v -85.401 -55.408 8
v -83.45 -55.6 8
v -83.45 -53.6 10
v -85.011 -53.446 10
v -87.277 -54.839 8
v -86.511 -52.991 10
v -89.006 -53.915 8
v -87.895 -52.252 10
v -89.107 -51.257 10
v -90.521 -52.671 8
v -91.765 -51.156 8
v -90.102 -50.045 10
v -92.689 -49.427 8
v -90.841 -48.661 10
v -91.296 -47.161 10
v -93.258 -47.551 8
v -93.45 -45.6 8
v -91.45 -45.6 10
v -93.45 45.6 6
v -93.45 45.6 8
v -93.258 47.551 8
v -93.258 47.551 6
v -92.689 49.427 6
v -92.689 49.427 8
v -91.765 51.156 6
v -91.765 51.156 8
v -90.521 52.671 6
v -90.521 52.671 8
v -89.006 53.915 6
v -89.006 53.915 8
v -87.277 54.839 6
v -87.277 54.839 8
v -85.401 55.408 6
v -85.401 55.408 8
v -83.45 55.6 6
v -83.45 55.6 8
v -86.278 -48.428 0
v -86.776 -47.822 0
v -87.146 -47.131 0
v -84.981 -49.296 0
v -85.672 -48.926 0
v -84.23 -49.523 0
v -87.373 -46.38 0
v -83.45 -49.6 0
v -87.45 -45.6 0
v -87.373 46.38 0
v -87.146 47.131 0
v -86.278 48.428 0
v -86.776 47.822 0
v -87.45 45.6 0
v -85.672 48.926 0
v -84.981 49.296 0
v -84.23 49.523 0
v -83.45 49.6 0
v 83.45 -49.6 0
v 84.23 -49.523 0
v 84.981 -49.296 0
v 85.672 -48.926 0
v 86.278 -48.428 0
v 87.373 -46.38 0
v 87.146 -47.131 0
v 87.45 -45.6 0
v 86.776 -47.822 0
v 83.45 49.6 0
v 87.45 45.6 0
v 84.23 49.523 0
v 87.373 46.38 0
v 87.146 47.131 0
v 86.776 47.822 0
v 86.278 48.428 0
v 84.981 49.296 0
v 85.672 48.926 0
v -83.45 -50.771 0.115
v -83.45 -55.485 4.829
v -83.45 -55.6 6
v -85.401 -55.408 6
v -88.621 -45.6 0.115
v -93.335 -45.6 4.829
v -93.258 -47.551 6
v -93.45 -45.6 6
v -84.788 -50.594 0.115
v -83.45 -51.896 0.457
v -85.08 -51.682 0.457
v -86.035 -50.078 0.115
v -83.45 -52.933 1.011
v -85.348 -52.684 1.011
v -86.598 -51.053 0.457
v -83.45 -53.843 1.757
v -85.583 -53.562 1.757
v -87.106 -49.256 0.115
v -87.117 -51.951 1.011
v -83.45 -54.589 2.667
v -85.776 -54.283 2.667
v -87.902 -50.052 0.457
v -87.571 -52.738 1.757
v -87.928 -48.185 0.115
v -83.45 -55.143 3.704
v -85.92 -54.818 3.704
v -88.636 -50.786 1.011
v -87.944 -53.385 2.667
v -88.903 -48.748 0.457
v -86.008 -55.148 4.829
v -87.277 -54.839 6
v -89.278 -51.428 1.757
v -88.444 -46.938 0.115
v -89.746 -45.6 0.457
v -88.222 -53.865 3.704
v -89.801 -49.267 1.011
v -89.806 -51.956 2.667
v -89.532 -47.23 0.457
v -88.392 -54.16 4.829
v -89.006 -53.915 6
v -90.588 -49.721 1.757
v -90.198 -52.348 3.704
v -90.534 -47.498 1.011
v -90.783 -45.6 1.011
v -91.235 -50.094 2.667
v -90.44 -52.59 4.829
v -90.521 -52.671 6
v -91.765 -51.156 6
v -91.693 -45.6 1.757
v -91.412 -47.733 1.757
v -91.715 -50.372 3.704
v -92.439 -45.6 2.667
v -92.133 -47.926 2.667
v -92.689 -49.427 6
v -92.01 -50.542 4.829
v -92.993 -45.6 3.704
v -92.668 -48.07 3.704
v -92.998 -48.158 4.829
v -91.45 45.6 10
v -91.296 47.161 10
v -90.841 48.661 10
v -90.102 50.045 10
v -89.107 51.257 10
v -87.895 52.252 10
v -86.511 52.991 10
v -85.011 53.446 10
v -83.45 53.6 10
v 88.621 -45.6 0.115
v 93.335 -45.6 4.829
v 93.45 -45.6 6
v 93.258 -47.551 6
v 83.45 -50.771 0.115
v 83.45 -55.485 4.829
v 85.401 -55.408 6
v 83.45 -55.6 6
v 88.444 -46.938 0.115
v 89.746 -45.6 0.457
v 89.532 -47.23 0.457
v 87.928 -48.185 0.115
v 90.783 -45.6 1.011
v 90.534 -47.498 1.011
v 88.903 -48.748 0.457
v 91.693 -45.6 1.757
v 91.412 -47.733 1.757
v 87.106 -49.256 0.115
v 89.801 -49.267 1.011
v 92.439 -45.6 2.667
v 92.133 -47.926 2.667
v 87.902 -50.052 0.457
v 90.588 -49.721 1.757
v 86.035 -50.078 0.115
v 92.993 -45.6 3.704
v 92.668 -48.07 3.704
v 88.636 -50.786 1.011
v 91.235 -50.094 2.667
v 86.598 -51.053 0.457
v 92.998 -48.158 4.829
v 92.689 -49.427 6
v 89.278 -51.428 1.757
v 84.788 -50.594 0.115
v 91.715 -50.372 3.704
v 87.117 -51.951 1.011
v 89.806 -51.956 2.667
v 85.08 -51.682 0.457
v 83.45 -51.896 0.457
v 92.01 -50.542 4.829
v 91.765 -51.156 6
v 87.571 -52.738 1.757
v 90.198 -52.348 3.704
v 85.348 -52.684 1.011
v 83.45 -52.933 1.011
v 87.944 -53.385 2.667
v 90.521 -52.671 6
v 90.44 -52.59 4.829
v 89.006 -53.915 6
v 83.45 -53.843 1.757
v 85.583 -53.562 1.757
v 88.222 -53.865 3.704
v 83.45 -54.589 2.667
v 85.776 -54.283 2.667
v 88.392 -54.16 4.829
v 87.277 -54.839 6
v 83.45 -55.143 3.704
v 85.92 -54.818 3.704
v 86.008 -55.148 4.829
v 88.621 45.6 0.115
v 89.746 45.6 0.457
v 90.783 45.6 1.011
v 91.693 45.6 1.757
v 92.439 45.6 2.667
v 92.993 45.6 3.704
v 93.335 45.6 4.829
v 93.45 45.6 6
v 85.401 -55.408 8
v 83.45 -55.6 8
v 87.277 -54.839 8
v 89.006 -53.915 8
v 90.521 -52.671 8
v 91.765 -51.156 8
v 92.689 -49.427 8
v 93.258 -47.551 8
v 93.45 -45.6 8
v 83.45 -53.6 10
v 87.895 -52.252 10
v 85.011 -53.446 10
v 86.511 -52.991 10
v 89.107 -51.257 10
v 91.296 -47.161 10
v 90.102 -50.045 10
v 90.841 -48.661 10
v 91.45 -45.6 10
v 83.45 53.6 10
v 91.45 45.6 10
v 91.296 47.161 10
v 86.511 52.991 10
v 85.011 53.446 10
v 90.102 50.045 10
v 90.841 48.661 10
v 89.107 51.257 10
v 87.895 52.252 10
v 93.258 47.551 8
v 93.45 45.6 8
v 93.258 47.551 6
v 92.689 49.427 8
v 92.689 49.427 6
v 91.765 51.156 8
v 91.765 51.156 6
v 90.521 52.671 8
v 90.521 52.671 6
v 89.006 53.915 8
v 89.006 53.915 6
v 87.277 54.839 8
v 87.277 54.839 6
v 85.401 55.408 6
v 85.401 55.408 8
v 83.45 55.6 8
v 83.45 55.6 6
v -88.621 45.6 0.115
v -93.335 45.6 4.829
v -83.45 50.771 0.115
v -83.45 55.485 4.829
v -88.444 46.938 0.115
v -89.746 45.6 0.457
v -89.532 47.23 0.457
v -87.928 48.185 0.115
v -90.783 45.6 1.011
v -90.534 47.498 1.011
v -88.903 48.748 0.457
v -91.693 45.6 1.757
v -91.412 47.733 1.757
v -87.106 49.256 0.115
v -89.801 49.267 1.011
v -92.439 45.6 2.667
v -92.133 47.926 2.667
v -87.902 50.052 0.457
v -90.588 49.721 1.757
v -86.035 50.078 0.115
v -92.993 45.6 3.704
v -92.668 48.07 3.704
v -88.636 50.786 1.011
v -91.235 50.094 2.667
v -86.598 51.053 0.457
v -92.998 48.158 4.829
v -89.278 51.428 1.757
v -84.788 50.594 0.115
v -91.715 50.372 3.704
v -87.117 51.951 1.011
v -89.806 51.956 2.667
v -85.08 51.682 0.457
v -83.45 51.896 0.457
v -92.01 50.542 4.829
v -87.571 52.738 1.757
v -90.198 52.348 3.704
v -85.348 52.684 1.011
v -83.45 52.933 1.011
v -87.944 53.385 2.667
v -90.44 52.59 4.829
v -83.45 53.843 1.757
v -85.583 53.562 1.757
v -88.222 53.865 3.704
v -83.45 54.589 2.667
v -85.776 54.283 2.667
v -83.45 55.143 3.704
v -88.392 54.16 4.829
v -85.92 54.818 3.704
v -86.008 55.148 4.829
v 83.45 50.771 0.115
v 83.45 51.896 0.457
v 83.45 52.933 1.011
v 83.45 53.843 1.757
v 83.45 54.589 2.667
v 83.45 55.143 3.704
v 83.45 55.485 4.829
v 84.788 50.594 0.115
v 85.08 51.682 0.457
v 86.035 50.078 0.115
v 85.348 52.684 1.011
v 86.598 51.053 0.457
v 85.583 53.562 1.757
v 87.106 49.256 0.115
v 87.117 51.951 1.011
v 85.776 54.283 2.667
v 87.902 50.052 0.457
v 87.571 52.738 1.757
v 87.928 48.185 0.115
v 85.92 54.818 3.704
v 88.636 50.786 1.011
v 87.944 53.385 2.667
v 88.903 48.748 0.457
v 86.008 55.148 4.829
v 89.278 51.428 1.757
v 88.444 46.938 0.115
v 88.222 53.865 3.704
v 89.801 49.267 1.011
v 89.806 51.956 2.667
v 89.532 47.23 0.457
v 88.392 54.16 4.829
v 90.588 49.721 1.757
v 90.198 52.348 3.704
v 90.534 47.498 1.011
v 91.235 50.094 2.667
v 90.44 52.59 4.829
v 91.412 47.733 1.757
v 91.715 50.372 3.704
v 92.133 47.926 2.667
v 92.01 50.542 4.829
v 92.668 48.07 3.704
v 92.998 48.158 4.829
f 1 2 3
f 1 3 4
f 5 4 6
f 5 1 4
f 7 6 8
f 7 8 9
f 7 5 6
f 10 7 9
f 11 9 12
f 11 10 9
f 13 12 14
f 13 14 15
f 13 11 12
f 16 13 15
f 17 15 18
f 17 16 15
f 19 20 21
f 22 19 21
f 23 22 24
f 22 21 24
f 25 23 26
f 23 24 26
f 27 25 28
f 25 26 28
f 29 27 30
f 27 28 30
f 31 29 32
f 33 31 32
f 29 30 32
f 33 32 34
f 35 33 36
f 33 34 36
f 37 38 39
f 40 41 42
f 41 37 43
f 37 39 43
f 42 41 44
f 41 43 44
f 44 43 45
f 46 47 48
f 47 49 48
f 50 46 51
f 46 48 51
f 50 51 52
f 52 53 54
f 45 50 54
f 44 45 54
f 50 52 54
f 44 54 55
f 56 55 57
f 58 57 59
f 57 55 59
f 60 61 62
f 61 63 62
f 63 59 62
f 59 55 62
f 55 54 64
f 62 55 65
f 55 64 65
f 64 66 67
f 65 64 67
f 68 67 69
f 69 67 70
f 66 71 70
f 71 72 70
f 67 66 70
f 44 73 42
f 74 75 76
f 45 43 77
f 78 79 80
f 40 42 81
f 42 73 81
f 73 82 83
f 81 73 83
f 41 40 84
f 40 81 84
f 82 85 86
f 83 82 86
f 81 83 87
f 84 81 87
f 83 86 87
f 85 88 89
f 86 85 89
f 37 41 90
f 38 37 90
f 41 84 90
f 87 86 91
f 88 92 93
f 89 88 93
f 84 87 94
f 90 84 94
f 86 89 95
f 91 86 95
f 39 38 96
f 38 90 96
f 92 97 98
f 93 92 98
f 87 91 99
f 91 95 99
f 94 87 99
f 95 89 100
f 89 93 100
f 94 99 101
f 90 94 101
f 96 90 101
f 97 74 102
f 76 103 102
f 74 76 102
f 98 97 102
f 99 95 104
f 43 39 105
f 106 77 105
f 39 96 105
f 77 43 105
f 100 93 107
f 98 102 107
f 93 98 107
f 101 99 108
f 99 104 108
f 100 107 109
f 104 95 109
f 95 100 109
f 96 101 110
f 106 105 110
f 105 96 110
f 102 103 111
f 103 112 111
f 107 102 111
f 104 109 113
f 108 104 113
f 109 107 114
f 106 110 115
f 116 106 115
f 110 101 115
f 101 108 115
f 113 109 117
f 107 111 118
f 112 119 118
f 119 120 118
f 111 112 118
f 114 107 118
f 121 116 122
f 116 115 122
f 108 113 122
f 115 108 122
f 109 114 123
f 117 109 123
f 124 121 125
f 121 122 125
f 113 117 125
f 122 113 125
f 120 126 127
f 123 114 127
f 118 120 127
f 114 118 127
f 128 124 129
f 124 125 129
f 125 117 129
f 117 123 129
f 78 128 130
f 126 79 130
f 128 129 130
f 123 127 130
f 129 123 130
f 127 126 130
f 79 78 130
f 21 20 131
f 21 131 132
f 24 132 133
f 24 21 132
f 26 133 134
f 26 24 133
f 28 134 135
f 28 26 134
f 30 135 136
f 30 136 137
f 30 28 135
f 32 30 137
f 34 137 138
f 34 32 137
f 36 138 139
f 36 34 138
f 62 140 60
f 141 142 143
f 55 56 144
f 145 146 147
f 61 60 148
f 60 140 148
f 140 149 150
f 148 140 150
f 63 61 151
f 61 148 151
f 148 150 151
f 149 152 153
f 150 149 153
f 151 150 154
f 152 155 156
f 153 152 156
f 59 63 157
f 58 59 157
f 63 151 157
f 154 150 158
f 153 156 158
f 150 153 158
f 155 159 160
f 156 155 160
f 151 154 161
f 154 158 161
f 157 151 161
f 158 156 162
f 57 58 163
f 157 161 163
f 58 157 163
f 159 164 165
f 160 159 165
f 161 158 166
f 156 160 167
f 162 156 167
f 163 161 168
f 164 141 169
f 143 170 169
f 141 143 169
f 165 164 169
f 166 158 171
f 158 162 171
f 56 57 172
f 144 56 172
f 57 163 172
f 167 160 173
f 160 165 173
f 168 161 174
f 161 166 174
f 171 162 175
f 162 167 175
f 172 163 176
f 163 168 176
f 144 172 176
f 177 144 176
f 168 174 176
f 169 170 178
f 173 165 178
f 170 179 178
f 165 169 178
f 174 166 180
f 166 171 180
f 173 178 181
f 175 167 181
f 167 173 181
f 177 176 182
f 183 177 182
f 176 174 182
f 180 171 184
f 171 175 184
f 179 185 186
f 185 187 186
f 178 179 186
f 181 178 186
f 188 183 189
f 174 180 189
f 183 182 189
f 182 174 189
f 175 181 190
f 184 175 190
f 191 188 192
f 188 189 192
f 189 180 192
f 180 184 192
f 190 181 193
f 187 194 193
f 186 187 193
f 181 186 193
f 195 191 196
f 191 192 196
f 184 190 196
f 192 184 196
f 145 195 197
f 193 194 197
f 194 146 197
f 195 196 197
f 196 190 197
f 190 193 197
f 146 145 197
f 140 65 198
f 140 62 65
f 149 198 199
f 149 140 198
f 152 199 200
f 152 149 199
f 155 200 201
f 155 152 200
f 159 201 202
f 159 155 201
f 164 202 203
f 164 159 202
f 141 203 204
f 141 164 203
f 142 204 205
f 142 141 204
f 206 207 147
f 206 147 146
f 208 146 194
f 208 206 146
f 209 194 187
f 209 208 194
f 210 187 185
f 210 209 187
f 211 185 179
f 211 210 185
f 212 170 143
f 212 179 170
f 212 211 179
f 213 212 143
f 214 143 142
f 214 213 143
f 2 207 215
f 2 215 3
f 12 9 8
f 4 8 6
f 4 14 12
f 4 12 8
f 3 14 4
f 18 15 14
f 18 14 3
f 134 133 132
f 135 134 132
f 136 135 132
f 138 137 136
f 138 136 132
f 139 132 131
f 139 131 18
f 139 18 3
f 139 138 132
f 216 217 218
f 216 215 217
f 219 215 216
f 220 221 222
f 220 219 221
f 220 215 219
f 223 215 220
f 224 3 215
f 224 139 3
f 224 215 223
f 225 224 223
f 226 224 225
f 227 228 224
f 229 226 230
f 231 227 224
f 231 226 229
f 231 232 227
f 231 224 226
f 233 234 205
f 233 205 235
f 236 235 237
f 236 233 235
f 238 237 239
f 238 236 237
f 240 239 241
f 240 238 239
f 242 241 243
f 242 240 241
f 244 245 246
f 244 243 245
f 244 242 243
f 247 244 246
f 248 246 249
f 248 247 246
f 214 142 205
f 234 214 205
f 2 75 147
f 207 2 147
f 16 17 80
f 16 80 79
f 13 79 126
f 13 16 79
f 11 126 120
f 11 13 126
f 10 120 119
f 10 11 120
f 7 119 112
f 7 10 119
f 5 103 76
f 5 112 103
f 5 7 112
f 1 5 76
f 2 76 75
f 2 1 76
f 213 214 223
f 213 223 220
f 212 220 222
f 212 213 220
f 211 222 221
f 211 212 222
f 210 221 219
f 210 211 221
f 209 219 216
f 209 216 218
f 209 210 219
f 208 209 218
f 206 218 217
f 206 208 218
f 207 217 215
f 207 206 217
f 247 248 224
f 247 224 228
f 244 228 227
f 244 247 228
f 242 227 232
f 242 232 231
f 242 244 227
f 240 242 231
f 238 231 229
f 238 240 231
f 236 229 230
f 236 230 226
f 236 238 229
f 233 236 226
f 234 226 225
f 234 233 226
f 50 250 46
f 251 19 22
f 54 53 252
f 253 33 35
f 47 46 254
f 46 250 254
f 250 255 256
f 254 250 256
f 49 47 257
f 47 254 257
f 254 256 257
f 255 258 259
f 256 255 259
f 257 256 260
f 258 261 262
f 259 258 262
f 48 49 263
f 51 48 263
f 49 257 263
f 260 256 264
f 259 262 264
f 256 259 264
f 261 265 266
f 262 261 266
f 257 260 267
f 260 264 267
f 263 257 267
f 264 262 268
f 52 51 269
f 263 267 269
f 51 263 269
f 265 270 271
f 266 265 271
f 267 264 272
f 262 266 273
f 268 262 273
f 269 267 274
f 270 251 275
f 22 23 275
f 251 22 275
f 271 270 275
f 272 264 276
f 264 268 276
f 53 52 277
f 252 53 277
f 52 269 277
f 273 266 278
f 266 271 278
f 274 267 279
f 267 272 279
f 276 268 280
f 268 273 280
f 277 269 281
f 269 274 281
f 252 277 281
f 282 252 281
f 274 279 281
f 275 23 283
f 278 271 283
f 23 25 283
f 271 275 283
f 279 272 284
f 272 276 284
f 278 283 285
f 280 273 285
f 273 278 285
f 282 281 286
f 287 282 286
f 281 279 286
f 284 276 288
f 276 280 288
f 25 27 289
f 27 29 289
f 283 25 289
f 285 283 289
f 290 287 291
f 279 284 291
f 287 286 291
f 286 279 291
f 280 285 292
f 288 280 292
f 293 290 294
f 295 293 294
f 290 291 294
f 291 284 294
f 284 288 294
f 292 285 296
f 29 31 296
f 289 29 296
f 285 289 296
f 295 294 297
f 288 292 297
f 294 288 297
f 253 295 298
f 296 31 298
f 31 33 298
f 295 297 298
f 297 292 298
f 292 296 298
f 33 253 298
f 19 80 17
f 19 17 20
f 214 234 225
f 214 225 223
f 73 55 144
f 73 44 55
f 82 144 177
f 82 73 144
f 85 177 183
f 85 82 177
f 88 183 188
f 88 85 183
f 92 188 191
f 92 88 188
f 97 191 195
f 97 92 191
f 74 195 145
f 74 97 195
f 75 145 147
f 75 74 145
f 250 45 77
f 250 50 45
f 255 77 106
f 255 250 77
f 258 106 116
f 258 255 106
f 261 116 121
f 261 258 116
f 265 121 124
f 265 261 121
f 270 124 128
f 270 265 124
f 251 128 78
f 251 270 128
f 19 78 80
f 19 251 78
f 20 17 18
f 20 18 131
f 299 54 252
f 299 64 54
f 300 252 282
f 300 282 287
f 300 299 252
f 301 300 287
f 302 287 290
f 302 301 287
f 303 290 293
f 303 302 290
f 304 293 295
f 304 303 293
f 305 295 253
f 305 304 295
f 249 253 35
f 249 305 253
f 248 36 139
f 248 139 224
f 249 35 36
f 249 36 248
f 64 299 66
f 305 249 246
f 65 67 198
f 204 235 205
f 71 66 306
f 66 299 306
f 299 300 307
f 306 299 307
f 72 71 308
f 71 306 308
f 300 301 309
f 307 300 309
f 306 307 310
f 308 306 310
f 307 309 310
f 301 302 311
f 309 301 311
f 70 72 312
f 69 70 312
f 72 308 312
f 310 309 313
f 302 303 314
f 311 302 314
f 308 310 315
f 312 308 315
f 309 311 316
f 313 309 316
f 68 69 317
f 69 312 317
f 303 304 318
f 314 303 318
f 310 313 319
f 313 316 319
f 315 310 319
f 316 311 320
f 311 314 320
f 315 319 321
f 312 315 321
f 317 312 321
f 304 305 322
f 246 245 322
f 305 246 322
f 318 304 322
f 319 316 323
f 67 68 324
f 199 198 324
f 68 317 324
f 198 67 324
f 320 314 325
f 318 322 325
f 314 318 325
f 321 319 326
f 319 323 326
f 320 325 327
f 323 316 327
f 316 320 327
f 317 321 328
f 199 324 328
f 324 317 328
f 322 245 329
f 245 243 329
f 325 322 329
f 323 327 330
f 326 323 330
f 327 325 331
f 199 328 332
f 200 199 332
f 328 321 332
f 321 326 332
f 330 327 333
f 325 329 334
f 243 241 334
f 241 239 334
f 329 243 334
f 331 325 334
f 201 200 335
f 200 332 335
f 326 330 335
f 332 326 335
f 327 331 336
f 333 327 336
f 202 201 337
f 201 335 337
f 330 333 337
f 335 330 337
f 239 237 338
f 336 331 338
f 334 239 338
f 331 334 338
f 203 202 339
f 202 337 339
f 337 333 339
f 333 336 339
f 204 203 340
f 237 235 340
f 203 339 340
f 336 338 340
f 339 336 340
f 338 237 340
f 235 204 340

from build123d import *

# Parameters (mm, degrees)
F0_W     = 186.9
F0_H     = 111.2
F1_DEPTH = 10
F2_R     = 10
F3_SIZE  = 2
F4_R     = 6


with BuildPart() as f1:
    # F0 (on Top) → F1 (new body)
    with BuildSketch(Plane.XY):
        Rectangle(F0_W, F0_H)
    extrude(amount=F1_DEPTH)

    # F2
    f2_edges = [f1.edges().sort_by_distance(p)[0] for p in [
        (93.45, 55.6, 5),
        (93.45, -55.6, 5),
        (-93.45, 55.6, 5),
        (-93.45, -55.6, 5),
    ]]
    fillet(f2_edges, radius=F2_R)

    # F3
    f3_edges = [f1.edges().sort_by_distance(p)[0] for p in [
        (0, 55.6, 10),
    ]]
    chamfer(f3_edges, length=F3_SIZE)

    # F4
    f4_edges = [f1.edges().sort_by_distance(p)[0] for p in [
        (0, 55.6, 0),
    ]]
    fillet(f4_edges, radius=F4_R)


solid = f1.part
